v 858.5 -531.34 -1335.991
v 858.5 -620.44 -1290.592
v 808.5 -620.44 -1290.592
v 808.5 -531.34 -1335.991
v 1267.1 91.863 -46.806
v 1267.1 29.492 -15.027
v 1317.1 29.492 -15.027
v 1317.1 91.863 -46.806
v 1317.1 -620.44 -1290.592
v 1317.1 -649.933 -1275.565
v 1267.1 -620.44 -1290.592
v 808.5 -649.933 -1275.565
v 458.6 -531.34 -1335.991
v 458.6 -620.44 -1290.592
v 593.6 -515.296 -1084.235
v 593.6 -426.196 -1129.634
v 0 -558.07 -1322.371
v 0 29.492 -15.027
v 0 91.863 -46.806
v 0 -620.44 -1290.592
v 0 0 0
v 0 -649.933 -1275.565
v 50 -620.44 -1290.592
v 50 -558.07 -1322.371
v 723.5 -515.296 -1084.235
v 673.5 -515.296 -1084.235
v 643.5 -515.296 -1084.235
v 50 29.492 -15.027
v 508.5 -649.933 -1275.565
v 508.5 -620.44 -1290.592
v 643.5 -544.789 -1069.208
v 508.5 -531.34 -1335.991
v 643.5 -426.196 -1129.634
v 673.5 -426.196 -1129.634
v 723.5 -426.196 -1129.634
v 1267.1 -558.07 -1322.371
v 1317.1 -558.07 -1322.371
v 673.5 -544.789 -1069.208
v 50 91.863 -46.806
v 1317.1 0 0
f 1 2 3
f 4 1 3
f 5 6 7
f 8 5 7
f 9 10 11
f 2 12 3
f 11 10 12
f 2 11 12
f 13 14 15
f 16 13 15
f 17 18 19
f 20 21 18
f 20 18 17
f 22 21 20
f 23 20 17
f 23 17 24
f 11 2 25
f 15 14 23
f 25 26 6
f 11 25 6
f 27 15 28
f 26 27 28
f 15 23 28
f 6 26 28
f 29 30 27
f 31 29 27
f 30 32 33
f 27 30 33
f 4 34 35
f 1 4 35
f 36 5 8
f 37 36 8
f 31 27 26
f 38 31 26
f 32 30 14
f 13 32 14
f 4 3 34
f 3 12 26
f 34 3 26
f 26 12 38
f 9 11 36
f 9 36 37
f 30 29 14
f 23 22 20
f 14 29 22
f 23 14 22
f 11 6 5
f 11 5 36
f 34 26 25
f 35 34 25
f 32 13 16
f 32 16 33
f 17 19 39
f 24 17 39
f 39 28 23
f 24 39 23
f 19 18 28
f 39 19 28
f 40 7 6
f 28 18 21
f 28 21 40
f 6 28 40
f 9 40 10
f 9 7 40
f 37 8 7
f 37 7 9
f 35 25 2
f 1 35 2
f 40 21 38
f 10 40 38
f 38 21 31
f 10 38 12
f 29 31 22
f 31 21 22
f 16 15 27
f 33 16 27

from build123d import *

# Parameters (mm, degrees)
BOSS_EXTRUDE1_DEPTH = 1317.1
CUT_EXTRUDE3_DEPTH  = 1956.361044318
SKETCH8_W           = 50
SKETCH8_H           = 1431.6
BOSS_EXTRUDE3_DEPTH = 70
BOSS_EXTRUDE4_DEPTH = 100


with BuildPart() as part:
    # Sketch1 → Boss-Extrude1 (new body)
    with BuildSketch(Plane(origin=(0, 0, 0), x_dir=(0, 0, -1), z_dir=(1, 0, 0))):
        Polygon((0, 0), (1275.564940028, -649.932799427), (1290.592025569, -620.440483477), (15.027085541, 29.492315951), align=None)
    extrude(amount=BOSS_EXTRUDE1_DEPTH)

    # Sketch6 → Cut-Extrude3 (cut, through all)
    with BuildSketch(Plane(origin=(0, 29.492315951, -15.027085541), x_dir=(1, 0, 0), z_dir=(0, 0.8910065241883676, -0.45399049973954747))):
        Polygon((808.5, 1431.6), (508.5, 1431.6), (643.5, 1200), (673.5, 1200), align=None)
    extrude(amount=-CUT_EXTRUDE3_DEPTH, mode=Mode.SUBTRACT)

    # Sketch8 → Boss-Extrude3 (add)
    with BuildSketch(Plane(origin=(0, 29.492315951, -15.027085541), x_dir=(1, 0, 0), z_dir=(0, 0.8910065241883676, -0.45399049973954747))):
        with Locations((25, 715.8)):
            Rectangle(SKETCH8_W, SKETCH8_H)
        with Locations((1292.1, 715.8)):
            Rectangle(SKETCH8_W, SKETCH8_H)
    extrude(amount=BOSS_EXTRUDE3_DEPTH)

    # Sketch8<4> → Boss-Extrude4 (add)
    with BuildSketch(Plane(origin=(0, 29.492315951, -15.027085541), x_dir=(1, 0, 0), z_dir=(0, 0.8910065241883676, -0.45399049973954747))):
        Polygon((808.5, 1431.6), (673.5, 1200), (723.5, 1200), (858.5, 1431.6), align=None)
        Polygon((458.6, 1431.6), (593.6, 1200), (643.5, 1200), (508.5, 1431.6), align=None)
    extrude(amount=BOSS_EXTRUDE4_DEPTH)


solid = part.part
